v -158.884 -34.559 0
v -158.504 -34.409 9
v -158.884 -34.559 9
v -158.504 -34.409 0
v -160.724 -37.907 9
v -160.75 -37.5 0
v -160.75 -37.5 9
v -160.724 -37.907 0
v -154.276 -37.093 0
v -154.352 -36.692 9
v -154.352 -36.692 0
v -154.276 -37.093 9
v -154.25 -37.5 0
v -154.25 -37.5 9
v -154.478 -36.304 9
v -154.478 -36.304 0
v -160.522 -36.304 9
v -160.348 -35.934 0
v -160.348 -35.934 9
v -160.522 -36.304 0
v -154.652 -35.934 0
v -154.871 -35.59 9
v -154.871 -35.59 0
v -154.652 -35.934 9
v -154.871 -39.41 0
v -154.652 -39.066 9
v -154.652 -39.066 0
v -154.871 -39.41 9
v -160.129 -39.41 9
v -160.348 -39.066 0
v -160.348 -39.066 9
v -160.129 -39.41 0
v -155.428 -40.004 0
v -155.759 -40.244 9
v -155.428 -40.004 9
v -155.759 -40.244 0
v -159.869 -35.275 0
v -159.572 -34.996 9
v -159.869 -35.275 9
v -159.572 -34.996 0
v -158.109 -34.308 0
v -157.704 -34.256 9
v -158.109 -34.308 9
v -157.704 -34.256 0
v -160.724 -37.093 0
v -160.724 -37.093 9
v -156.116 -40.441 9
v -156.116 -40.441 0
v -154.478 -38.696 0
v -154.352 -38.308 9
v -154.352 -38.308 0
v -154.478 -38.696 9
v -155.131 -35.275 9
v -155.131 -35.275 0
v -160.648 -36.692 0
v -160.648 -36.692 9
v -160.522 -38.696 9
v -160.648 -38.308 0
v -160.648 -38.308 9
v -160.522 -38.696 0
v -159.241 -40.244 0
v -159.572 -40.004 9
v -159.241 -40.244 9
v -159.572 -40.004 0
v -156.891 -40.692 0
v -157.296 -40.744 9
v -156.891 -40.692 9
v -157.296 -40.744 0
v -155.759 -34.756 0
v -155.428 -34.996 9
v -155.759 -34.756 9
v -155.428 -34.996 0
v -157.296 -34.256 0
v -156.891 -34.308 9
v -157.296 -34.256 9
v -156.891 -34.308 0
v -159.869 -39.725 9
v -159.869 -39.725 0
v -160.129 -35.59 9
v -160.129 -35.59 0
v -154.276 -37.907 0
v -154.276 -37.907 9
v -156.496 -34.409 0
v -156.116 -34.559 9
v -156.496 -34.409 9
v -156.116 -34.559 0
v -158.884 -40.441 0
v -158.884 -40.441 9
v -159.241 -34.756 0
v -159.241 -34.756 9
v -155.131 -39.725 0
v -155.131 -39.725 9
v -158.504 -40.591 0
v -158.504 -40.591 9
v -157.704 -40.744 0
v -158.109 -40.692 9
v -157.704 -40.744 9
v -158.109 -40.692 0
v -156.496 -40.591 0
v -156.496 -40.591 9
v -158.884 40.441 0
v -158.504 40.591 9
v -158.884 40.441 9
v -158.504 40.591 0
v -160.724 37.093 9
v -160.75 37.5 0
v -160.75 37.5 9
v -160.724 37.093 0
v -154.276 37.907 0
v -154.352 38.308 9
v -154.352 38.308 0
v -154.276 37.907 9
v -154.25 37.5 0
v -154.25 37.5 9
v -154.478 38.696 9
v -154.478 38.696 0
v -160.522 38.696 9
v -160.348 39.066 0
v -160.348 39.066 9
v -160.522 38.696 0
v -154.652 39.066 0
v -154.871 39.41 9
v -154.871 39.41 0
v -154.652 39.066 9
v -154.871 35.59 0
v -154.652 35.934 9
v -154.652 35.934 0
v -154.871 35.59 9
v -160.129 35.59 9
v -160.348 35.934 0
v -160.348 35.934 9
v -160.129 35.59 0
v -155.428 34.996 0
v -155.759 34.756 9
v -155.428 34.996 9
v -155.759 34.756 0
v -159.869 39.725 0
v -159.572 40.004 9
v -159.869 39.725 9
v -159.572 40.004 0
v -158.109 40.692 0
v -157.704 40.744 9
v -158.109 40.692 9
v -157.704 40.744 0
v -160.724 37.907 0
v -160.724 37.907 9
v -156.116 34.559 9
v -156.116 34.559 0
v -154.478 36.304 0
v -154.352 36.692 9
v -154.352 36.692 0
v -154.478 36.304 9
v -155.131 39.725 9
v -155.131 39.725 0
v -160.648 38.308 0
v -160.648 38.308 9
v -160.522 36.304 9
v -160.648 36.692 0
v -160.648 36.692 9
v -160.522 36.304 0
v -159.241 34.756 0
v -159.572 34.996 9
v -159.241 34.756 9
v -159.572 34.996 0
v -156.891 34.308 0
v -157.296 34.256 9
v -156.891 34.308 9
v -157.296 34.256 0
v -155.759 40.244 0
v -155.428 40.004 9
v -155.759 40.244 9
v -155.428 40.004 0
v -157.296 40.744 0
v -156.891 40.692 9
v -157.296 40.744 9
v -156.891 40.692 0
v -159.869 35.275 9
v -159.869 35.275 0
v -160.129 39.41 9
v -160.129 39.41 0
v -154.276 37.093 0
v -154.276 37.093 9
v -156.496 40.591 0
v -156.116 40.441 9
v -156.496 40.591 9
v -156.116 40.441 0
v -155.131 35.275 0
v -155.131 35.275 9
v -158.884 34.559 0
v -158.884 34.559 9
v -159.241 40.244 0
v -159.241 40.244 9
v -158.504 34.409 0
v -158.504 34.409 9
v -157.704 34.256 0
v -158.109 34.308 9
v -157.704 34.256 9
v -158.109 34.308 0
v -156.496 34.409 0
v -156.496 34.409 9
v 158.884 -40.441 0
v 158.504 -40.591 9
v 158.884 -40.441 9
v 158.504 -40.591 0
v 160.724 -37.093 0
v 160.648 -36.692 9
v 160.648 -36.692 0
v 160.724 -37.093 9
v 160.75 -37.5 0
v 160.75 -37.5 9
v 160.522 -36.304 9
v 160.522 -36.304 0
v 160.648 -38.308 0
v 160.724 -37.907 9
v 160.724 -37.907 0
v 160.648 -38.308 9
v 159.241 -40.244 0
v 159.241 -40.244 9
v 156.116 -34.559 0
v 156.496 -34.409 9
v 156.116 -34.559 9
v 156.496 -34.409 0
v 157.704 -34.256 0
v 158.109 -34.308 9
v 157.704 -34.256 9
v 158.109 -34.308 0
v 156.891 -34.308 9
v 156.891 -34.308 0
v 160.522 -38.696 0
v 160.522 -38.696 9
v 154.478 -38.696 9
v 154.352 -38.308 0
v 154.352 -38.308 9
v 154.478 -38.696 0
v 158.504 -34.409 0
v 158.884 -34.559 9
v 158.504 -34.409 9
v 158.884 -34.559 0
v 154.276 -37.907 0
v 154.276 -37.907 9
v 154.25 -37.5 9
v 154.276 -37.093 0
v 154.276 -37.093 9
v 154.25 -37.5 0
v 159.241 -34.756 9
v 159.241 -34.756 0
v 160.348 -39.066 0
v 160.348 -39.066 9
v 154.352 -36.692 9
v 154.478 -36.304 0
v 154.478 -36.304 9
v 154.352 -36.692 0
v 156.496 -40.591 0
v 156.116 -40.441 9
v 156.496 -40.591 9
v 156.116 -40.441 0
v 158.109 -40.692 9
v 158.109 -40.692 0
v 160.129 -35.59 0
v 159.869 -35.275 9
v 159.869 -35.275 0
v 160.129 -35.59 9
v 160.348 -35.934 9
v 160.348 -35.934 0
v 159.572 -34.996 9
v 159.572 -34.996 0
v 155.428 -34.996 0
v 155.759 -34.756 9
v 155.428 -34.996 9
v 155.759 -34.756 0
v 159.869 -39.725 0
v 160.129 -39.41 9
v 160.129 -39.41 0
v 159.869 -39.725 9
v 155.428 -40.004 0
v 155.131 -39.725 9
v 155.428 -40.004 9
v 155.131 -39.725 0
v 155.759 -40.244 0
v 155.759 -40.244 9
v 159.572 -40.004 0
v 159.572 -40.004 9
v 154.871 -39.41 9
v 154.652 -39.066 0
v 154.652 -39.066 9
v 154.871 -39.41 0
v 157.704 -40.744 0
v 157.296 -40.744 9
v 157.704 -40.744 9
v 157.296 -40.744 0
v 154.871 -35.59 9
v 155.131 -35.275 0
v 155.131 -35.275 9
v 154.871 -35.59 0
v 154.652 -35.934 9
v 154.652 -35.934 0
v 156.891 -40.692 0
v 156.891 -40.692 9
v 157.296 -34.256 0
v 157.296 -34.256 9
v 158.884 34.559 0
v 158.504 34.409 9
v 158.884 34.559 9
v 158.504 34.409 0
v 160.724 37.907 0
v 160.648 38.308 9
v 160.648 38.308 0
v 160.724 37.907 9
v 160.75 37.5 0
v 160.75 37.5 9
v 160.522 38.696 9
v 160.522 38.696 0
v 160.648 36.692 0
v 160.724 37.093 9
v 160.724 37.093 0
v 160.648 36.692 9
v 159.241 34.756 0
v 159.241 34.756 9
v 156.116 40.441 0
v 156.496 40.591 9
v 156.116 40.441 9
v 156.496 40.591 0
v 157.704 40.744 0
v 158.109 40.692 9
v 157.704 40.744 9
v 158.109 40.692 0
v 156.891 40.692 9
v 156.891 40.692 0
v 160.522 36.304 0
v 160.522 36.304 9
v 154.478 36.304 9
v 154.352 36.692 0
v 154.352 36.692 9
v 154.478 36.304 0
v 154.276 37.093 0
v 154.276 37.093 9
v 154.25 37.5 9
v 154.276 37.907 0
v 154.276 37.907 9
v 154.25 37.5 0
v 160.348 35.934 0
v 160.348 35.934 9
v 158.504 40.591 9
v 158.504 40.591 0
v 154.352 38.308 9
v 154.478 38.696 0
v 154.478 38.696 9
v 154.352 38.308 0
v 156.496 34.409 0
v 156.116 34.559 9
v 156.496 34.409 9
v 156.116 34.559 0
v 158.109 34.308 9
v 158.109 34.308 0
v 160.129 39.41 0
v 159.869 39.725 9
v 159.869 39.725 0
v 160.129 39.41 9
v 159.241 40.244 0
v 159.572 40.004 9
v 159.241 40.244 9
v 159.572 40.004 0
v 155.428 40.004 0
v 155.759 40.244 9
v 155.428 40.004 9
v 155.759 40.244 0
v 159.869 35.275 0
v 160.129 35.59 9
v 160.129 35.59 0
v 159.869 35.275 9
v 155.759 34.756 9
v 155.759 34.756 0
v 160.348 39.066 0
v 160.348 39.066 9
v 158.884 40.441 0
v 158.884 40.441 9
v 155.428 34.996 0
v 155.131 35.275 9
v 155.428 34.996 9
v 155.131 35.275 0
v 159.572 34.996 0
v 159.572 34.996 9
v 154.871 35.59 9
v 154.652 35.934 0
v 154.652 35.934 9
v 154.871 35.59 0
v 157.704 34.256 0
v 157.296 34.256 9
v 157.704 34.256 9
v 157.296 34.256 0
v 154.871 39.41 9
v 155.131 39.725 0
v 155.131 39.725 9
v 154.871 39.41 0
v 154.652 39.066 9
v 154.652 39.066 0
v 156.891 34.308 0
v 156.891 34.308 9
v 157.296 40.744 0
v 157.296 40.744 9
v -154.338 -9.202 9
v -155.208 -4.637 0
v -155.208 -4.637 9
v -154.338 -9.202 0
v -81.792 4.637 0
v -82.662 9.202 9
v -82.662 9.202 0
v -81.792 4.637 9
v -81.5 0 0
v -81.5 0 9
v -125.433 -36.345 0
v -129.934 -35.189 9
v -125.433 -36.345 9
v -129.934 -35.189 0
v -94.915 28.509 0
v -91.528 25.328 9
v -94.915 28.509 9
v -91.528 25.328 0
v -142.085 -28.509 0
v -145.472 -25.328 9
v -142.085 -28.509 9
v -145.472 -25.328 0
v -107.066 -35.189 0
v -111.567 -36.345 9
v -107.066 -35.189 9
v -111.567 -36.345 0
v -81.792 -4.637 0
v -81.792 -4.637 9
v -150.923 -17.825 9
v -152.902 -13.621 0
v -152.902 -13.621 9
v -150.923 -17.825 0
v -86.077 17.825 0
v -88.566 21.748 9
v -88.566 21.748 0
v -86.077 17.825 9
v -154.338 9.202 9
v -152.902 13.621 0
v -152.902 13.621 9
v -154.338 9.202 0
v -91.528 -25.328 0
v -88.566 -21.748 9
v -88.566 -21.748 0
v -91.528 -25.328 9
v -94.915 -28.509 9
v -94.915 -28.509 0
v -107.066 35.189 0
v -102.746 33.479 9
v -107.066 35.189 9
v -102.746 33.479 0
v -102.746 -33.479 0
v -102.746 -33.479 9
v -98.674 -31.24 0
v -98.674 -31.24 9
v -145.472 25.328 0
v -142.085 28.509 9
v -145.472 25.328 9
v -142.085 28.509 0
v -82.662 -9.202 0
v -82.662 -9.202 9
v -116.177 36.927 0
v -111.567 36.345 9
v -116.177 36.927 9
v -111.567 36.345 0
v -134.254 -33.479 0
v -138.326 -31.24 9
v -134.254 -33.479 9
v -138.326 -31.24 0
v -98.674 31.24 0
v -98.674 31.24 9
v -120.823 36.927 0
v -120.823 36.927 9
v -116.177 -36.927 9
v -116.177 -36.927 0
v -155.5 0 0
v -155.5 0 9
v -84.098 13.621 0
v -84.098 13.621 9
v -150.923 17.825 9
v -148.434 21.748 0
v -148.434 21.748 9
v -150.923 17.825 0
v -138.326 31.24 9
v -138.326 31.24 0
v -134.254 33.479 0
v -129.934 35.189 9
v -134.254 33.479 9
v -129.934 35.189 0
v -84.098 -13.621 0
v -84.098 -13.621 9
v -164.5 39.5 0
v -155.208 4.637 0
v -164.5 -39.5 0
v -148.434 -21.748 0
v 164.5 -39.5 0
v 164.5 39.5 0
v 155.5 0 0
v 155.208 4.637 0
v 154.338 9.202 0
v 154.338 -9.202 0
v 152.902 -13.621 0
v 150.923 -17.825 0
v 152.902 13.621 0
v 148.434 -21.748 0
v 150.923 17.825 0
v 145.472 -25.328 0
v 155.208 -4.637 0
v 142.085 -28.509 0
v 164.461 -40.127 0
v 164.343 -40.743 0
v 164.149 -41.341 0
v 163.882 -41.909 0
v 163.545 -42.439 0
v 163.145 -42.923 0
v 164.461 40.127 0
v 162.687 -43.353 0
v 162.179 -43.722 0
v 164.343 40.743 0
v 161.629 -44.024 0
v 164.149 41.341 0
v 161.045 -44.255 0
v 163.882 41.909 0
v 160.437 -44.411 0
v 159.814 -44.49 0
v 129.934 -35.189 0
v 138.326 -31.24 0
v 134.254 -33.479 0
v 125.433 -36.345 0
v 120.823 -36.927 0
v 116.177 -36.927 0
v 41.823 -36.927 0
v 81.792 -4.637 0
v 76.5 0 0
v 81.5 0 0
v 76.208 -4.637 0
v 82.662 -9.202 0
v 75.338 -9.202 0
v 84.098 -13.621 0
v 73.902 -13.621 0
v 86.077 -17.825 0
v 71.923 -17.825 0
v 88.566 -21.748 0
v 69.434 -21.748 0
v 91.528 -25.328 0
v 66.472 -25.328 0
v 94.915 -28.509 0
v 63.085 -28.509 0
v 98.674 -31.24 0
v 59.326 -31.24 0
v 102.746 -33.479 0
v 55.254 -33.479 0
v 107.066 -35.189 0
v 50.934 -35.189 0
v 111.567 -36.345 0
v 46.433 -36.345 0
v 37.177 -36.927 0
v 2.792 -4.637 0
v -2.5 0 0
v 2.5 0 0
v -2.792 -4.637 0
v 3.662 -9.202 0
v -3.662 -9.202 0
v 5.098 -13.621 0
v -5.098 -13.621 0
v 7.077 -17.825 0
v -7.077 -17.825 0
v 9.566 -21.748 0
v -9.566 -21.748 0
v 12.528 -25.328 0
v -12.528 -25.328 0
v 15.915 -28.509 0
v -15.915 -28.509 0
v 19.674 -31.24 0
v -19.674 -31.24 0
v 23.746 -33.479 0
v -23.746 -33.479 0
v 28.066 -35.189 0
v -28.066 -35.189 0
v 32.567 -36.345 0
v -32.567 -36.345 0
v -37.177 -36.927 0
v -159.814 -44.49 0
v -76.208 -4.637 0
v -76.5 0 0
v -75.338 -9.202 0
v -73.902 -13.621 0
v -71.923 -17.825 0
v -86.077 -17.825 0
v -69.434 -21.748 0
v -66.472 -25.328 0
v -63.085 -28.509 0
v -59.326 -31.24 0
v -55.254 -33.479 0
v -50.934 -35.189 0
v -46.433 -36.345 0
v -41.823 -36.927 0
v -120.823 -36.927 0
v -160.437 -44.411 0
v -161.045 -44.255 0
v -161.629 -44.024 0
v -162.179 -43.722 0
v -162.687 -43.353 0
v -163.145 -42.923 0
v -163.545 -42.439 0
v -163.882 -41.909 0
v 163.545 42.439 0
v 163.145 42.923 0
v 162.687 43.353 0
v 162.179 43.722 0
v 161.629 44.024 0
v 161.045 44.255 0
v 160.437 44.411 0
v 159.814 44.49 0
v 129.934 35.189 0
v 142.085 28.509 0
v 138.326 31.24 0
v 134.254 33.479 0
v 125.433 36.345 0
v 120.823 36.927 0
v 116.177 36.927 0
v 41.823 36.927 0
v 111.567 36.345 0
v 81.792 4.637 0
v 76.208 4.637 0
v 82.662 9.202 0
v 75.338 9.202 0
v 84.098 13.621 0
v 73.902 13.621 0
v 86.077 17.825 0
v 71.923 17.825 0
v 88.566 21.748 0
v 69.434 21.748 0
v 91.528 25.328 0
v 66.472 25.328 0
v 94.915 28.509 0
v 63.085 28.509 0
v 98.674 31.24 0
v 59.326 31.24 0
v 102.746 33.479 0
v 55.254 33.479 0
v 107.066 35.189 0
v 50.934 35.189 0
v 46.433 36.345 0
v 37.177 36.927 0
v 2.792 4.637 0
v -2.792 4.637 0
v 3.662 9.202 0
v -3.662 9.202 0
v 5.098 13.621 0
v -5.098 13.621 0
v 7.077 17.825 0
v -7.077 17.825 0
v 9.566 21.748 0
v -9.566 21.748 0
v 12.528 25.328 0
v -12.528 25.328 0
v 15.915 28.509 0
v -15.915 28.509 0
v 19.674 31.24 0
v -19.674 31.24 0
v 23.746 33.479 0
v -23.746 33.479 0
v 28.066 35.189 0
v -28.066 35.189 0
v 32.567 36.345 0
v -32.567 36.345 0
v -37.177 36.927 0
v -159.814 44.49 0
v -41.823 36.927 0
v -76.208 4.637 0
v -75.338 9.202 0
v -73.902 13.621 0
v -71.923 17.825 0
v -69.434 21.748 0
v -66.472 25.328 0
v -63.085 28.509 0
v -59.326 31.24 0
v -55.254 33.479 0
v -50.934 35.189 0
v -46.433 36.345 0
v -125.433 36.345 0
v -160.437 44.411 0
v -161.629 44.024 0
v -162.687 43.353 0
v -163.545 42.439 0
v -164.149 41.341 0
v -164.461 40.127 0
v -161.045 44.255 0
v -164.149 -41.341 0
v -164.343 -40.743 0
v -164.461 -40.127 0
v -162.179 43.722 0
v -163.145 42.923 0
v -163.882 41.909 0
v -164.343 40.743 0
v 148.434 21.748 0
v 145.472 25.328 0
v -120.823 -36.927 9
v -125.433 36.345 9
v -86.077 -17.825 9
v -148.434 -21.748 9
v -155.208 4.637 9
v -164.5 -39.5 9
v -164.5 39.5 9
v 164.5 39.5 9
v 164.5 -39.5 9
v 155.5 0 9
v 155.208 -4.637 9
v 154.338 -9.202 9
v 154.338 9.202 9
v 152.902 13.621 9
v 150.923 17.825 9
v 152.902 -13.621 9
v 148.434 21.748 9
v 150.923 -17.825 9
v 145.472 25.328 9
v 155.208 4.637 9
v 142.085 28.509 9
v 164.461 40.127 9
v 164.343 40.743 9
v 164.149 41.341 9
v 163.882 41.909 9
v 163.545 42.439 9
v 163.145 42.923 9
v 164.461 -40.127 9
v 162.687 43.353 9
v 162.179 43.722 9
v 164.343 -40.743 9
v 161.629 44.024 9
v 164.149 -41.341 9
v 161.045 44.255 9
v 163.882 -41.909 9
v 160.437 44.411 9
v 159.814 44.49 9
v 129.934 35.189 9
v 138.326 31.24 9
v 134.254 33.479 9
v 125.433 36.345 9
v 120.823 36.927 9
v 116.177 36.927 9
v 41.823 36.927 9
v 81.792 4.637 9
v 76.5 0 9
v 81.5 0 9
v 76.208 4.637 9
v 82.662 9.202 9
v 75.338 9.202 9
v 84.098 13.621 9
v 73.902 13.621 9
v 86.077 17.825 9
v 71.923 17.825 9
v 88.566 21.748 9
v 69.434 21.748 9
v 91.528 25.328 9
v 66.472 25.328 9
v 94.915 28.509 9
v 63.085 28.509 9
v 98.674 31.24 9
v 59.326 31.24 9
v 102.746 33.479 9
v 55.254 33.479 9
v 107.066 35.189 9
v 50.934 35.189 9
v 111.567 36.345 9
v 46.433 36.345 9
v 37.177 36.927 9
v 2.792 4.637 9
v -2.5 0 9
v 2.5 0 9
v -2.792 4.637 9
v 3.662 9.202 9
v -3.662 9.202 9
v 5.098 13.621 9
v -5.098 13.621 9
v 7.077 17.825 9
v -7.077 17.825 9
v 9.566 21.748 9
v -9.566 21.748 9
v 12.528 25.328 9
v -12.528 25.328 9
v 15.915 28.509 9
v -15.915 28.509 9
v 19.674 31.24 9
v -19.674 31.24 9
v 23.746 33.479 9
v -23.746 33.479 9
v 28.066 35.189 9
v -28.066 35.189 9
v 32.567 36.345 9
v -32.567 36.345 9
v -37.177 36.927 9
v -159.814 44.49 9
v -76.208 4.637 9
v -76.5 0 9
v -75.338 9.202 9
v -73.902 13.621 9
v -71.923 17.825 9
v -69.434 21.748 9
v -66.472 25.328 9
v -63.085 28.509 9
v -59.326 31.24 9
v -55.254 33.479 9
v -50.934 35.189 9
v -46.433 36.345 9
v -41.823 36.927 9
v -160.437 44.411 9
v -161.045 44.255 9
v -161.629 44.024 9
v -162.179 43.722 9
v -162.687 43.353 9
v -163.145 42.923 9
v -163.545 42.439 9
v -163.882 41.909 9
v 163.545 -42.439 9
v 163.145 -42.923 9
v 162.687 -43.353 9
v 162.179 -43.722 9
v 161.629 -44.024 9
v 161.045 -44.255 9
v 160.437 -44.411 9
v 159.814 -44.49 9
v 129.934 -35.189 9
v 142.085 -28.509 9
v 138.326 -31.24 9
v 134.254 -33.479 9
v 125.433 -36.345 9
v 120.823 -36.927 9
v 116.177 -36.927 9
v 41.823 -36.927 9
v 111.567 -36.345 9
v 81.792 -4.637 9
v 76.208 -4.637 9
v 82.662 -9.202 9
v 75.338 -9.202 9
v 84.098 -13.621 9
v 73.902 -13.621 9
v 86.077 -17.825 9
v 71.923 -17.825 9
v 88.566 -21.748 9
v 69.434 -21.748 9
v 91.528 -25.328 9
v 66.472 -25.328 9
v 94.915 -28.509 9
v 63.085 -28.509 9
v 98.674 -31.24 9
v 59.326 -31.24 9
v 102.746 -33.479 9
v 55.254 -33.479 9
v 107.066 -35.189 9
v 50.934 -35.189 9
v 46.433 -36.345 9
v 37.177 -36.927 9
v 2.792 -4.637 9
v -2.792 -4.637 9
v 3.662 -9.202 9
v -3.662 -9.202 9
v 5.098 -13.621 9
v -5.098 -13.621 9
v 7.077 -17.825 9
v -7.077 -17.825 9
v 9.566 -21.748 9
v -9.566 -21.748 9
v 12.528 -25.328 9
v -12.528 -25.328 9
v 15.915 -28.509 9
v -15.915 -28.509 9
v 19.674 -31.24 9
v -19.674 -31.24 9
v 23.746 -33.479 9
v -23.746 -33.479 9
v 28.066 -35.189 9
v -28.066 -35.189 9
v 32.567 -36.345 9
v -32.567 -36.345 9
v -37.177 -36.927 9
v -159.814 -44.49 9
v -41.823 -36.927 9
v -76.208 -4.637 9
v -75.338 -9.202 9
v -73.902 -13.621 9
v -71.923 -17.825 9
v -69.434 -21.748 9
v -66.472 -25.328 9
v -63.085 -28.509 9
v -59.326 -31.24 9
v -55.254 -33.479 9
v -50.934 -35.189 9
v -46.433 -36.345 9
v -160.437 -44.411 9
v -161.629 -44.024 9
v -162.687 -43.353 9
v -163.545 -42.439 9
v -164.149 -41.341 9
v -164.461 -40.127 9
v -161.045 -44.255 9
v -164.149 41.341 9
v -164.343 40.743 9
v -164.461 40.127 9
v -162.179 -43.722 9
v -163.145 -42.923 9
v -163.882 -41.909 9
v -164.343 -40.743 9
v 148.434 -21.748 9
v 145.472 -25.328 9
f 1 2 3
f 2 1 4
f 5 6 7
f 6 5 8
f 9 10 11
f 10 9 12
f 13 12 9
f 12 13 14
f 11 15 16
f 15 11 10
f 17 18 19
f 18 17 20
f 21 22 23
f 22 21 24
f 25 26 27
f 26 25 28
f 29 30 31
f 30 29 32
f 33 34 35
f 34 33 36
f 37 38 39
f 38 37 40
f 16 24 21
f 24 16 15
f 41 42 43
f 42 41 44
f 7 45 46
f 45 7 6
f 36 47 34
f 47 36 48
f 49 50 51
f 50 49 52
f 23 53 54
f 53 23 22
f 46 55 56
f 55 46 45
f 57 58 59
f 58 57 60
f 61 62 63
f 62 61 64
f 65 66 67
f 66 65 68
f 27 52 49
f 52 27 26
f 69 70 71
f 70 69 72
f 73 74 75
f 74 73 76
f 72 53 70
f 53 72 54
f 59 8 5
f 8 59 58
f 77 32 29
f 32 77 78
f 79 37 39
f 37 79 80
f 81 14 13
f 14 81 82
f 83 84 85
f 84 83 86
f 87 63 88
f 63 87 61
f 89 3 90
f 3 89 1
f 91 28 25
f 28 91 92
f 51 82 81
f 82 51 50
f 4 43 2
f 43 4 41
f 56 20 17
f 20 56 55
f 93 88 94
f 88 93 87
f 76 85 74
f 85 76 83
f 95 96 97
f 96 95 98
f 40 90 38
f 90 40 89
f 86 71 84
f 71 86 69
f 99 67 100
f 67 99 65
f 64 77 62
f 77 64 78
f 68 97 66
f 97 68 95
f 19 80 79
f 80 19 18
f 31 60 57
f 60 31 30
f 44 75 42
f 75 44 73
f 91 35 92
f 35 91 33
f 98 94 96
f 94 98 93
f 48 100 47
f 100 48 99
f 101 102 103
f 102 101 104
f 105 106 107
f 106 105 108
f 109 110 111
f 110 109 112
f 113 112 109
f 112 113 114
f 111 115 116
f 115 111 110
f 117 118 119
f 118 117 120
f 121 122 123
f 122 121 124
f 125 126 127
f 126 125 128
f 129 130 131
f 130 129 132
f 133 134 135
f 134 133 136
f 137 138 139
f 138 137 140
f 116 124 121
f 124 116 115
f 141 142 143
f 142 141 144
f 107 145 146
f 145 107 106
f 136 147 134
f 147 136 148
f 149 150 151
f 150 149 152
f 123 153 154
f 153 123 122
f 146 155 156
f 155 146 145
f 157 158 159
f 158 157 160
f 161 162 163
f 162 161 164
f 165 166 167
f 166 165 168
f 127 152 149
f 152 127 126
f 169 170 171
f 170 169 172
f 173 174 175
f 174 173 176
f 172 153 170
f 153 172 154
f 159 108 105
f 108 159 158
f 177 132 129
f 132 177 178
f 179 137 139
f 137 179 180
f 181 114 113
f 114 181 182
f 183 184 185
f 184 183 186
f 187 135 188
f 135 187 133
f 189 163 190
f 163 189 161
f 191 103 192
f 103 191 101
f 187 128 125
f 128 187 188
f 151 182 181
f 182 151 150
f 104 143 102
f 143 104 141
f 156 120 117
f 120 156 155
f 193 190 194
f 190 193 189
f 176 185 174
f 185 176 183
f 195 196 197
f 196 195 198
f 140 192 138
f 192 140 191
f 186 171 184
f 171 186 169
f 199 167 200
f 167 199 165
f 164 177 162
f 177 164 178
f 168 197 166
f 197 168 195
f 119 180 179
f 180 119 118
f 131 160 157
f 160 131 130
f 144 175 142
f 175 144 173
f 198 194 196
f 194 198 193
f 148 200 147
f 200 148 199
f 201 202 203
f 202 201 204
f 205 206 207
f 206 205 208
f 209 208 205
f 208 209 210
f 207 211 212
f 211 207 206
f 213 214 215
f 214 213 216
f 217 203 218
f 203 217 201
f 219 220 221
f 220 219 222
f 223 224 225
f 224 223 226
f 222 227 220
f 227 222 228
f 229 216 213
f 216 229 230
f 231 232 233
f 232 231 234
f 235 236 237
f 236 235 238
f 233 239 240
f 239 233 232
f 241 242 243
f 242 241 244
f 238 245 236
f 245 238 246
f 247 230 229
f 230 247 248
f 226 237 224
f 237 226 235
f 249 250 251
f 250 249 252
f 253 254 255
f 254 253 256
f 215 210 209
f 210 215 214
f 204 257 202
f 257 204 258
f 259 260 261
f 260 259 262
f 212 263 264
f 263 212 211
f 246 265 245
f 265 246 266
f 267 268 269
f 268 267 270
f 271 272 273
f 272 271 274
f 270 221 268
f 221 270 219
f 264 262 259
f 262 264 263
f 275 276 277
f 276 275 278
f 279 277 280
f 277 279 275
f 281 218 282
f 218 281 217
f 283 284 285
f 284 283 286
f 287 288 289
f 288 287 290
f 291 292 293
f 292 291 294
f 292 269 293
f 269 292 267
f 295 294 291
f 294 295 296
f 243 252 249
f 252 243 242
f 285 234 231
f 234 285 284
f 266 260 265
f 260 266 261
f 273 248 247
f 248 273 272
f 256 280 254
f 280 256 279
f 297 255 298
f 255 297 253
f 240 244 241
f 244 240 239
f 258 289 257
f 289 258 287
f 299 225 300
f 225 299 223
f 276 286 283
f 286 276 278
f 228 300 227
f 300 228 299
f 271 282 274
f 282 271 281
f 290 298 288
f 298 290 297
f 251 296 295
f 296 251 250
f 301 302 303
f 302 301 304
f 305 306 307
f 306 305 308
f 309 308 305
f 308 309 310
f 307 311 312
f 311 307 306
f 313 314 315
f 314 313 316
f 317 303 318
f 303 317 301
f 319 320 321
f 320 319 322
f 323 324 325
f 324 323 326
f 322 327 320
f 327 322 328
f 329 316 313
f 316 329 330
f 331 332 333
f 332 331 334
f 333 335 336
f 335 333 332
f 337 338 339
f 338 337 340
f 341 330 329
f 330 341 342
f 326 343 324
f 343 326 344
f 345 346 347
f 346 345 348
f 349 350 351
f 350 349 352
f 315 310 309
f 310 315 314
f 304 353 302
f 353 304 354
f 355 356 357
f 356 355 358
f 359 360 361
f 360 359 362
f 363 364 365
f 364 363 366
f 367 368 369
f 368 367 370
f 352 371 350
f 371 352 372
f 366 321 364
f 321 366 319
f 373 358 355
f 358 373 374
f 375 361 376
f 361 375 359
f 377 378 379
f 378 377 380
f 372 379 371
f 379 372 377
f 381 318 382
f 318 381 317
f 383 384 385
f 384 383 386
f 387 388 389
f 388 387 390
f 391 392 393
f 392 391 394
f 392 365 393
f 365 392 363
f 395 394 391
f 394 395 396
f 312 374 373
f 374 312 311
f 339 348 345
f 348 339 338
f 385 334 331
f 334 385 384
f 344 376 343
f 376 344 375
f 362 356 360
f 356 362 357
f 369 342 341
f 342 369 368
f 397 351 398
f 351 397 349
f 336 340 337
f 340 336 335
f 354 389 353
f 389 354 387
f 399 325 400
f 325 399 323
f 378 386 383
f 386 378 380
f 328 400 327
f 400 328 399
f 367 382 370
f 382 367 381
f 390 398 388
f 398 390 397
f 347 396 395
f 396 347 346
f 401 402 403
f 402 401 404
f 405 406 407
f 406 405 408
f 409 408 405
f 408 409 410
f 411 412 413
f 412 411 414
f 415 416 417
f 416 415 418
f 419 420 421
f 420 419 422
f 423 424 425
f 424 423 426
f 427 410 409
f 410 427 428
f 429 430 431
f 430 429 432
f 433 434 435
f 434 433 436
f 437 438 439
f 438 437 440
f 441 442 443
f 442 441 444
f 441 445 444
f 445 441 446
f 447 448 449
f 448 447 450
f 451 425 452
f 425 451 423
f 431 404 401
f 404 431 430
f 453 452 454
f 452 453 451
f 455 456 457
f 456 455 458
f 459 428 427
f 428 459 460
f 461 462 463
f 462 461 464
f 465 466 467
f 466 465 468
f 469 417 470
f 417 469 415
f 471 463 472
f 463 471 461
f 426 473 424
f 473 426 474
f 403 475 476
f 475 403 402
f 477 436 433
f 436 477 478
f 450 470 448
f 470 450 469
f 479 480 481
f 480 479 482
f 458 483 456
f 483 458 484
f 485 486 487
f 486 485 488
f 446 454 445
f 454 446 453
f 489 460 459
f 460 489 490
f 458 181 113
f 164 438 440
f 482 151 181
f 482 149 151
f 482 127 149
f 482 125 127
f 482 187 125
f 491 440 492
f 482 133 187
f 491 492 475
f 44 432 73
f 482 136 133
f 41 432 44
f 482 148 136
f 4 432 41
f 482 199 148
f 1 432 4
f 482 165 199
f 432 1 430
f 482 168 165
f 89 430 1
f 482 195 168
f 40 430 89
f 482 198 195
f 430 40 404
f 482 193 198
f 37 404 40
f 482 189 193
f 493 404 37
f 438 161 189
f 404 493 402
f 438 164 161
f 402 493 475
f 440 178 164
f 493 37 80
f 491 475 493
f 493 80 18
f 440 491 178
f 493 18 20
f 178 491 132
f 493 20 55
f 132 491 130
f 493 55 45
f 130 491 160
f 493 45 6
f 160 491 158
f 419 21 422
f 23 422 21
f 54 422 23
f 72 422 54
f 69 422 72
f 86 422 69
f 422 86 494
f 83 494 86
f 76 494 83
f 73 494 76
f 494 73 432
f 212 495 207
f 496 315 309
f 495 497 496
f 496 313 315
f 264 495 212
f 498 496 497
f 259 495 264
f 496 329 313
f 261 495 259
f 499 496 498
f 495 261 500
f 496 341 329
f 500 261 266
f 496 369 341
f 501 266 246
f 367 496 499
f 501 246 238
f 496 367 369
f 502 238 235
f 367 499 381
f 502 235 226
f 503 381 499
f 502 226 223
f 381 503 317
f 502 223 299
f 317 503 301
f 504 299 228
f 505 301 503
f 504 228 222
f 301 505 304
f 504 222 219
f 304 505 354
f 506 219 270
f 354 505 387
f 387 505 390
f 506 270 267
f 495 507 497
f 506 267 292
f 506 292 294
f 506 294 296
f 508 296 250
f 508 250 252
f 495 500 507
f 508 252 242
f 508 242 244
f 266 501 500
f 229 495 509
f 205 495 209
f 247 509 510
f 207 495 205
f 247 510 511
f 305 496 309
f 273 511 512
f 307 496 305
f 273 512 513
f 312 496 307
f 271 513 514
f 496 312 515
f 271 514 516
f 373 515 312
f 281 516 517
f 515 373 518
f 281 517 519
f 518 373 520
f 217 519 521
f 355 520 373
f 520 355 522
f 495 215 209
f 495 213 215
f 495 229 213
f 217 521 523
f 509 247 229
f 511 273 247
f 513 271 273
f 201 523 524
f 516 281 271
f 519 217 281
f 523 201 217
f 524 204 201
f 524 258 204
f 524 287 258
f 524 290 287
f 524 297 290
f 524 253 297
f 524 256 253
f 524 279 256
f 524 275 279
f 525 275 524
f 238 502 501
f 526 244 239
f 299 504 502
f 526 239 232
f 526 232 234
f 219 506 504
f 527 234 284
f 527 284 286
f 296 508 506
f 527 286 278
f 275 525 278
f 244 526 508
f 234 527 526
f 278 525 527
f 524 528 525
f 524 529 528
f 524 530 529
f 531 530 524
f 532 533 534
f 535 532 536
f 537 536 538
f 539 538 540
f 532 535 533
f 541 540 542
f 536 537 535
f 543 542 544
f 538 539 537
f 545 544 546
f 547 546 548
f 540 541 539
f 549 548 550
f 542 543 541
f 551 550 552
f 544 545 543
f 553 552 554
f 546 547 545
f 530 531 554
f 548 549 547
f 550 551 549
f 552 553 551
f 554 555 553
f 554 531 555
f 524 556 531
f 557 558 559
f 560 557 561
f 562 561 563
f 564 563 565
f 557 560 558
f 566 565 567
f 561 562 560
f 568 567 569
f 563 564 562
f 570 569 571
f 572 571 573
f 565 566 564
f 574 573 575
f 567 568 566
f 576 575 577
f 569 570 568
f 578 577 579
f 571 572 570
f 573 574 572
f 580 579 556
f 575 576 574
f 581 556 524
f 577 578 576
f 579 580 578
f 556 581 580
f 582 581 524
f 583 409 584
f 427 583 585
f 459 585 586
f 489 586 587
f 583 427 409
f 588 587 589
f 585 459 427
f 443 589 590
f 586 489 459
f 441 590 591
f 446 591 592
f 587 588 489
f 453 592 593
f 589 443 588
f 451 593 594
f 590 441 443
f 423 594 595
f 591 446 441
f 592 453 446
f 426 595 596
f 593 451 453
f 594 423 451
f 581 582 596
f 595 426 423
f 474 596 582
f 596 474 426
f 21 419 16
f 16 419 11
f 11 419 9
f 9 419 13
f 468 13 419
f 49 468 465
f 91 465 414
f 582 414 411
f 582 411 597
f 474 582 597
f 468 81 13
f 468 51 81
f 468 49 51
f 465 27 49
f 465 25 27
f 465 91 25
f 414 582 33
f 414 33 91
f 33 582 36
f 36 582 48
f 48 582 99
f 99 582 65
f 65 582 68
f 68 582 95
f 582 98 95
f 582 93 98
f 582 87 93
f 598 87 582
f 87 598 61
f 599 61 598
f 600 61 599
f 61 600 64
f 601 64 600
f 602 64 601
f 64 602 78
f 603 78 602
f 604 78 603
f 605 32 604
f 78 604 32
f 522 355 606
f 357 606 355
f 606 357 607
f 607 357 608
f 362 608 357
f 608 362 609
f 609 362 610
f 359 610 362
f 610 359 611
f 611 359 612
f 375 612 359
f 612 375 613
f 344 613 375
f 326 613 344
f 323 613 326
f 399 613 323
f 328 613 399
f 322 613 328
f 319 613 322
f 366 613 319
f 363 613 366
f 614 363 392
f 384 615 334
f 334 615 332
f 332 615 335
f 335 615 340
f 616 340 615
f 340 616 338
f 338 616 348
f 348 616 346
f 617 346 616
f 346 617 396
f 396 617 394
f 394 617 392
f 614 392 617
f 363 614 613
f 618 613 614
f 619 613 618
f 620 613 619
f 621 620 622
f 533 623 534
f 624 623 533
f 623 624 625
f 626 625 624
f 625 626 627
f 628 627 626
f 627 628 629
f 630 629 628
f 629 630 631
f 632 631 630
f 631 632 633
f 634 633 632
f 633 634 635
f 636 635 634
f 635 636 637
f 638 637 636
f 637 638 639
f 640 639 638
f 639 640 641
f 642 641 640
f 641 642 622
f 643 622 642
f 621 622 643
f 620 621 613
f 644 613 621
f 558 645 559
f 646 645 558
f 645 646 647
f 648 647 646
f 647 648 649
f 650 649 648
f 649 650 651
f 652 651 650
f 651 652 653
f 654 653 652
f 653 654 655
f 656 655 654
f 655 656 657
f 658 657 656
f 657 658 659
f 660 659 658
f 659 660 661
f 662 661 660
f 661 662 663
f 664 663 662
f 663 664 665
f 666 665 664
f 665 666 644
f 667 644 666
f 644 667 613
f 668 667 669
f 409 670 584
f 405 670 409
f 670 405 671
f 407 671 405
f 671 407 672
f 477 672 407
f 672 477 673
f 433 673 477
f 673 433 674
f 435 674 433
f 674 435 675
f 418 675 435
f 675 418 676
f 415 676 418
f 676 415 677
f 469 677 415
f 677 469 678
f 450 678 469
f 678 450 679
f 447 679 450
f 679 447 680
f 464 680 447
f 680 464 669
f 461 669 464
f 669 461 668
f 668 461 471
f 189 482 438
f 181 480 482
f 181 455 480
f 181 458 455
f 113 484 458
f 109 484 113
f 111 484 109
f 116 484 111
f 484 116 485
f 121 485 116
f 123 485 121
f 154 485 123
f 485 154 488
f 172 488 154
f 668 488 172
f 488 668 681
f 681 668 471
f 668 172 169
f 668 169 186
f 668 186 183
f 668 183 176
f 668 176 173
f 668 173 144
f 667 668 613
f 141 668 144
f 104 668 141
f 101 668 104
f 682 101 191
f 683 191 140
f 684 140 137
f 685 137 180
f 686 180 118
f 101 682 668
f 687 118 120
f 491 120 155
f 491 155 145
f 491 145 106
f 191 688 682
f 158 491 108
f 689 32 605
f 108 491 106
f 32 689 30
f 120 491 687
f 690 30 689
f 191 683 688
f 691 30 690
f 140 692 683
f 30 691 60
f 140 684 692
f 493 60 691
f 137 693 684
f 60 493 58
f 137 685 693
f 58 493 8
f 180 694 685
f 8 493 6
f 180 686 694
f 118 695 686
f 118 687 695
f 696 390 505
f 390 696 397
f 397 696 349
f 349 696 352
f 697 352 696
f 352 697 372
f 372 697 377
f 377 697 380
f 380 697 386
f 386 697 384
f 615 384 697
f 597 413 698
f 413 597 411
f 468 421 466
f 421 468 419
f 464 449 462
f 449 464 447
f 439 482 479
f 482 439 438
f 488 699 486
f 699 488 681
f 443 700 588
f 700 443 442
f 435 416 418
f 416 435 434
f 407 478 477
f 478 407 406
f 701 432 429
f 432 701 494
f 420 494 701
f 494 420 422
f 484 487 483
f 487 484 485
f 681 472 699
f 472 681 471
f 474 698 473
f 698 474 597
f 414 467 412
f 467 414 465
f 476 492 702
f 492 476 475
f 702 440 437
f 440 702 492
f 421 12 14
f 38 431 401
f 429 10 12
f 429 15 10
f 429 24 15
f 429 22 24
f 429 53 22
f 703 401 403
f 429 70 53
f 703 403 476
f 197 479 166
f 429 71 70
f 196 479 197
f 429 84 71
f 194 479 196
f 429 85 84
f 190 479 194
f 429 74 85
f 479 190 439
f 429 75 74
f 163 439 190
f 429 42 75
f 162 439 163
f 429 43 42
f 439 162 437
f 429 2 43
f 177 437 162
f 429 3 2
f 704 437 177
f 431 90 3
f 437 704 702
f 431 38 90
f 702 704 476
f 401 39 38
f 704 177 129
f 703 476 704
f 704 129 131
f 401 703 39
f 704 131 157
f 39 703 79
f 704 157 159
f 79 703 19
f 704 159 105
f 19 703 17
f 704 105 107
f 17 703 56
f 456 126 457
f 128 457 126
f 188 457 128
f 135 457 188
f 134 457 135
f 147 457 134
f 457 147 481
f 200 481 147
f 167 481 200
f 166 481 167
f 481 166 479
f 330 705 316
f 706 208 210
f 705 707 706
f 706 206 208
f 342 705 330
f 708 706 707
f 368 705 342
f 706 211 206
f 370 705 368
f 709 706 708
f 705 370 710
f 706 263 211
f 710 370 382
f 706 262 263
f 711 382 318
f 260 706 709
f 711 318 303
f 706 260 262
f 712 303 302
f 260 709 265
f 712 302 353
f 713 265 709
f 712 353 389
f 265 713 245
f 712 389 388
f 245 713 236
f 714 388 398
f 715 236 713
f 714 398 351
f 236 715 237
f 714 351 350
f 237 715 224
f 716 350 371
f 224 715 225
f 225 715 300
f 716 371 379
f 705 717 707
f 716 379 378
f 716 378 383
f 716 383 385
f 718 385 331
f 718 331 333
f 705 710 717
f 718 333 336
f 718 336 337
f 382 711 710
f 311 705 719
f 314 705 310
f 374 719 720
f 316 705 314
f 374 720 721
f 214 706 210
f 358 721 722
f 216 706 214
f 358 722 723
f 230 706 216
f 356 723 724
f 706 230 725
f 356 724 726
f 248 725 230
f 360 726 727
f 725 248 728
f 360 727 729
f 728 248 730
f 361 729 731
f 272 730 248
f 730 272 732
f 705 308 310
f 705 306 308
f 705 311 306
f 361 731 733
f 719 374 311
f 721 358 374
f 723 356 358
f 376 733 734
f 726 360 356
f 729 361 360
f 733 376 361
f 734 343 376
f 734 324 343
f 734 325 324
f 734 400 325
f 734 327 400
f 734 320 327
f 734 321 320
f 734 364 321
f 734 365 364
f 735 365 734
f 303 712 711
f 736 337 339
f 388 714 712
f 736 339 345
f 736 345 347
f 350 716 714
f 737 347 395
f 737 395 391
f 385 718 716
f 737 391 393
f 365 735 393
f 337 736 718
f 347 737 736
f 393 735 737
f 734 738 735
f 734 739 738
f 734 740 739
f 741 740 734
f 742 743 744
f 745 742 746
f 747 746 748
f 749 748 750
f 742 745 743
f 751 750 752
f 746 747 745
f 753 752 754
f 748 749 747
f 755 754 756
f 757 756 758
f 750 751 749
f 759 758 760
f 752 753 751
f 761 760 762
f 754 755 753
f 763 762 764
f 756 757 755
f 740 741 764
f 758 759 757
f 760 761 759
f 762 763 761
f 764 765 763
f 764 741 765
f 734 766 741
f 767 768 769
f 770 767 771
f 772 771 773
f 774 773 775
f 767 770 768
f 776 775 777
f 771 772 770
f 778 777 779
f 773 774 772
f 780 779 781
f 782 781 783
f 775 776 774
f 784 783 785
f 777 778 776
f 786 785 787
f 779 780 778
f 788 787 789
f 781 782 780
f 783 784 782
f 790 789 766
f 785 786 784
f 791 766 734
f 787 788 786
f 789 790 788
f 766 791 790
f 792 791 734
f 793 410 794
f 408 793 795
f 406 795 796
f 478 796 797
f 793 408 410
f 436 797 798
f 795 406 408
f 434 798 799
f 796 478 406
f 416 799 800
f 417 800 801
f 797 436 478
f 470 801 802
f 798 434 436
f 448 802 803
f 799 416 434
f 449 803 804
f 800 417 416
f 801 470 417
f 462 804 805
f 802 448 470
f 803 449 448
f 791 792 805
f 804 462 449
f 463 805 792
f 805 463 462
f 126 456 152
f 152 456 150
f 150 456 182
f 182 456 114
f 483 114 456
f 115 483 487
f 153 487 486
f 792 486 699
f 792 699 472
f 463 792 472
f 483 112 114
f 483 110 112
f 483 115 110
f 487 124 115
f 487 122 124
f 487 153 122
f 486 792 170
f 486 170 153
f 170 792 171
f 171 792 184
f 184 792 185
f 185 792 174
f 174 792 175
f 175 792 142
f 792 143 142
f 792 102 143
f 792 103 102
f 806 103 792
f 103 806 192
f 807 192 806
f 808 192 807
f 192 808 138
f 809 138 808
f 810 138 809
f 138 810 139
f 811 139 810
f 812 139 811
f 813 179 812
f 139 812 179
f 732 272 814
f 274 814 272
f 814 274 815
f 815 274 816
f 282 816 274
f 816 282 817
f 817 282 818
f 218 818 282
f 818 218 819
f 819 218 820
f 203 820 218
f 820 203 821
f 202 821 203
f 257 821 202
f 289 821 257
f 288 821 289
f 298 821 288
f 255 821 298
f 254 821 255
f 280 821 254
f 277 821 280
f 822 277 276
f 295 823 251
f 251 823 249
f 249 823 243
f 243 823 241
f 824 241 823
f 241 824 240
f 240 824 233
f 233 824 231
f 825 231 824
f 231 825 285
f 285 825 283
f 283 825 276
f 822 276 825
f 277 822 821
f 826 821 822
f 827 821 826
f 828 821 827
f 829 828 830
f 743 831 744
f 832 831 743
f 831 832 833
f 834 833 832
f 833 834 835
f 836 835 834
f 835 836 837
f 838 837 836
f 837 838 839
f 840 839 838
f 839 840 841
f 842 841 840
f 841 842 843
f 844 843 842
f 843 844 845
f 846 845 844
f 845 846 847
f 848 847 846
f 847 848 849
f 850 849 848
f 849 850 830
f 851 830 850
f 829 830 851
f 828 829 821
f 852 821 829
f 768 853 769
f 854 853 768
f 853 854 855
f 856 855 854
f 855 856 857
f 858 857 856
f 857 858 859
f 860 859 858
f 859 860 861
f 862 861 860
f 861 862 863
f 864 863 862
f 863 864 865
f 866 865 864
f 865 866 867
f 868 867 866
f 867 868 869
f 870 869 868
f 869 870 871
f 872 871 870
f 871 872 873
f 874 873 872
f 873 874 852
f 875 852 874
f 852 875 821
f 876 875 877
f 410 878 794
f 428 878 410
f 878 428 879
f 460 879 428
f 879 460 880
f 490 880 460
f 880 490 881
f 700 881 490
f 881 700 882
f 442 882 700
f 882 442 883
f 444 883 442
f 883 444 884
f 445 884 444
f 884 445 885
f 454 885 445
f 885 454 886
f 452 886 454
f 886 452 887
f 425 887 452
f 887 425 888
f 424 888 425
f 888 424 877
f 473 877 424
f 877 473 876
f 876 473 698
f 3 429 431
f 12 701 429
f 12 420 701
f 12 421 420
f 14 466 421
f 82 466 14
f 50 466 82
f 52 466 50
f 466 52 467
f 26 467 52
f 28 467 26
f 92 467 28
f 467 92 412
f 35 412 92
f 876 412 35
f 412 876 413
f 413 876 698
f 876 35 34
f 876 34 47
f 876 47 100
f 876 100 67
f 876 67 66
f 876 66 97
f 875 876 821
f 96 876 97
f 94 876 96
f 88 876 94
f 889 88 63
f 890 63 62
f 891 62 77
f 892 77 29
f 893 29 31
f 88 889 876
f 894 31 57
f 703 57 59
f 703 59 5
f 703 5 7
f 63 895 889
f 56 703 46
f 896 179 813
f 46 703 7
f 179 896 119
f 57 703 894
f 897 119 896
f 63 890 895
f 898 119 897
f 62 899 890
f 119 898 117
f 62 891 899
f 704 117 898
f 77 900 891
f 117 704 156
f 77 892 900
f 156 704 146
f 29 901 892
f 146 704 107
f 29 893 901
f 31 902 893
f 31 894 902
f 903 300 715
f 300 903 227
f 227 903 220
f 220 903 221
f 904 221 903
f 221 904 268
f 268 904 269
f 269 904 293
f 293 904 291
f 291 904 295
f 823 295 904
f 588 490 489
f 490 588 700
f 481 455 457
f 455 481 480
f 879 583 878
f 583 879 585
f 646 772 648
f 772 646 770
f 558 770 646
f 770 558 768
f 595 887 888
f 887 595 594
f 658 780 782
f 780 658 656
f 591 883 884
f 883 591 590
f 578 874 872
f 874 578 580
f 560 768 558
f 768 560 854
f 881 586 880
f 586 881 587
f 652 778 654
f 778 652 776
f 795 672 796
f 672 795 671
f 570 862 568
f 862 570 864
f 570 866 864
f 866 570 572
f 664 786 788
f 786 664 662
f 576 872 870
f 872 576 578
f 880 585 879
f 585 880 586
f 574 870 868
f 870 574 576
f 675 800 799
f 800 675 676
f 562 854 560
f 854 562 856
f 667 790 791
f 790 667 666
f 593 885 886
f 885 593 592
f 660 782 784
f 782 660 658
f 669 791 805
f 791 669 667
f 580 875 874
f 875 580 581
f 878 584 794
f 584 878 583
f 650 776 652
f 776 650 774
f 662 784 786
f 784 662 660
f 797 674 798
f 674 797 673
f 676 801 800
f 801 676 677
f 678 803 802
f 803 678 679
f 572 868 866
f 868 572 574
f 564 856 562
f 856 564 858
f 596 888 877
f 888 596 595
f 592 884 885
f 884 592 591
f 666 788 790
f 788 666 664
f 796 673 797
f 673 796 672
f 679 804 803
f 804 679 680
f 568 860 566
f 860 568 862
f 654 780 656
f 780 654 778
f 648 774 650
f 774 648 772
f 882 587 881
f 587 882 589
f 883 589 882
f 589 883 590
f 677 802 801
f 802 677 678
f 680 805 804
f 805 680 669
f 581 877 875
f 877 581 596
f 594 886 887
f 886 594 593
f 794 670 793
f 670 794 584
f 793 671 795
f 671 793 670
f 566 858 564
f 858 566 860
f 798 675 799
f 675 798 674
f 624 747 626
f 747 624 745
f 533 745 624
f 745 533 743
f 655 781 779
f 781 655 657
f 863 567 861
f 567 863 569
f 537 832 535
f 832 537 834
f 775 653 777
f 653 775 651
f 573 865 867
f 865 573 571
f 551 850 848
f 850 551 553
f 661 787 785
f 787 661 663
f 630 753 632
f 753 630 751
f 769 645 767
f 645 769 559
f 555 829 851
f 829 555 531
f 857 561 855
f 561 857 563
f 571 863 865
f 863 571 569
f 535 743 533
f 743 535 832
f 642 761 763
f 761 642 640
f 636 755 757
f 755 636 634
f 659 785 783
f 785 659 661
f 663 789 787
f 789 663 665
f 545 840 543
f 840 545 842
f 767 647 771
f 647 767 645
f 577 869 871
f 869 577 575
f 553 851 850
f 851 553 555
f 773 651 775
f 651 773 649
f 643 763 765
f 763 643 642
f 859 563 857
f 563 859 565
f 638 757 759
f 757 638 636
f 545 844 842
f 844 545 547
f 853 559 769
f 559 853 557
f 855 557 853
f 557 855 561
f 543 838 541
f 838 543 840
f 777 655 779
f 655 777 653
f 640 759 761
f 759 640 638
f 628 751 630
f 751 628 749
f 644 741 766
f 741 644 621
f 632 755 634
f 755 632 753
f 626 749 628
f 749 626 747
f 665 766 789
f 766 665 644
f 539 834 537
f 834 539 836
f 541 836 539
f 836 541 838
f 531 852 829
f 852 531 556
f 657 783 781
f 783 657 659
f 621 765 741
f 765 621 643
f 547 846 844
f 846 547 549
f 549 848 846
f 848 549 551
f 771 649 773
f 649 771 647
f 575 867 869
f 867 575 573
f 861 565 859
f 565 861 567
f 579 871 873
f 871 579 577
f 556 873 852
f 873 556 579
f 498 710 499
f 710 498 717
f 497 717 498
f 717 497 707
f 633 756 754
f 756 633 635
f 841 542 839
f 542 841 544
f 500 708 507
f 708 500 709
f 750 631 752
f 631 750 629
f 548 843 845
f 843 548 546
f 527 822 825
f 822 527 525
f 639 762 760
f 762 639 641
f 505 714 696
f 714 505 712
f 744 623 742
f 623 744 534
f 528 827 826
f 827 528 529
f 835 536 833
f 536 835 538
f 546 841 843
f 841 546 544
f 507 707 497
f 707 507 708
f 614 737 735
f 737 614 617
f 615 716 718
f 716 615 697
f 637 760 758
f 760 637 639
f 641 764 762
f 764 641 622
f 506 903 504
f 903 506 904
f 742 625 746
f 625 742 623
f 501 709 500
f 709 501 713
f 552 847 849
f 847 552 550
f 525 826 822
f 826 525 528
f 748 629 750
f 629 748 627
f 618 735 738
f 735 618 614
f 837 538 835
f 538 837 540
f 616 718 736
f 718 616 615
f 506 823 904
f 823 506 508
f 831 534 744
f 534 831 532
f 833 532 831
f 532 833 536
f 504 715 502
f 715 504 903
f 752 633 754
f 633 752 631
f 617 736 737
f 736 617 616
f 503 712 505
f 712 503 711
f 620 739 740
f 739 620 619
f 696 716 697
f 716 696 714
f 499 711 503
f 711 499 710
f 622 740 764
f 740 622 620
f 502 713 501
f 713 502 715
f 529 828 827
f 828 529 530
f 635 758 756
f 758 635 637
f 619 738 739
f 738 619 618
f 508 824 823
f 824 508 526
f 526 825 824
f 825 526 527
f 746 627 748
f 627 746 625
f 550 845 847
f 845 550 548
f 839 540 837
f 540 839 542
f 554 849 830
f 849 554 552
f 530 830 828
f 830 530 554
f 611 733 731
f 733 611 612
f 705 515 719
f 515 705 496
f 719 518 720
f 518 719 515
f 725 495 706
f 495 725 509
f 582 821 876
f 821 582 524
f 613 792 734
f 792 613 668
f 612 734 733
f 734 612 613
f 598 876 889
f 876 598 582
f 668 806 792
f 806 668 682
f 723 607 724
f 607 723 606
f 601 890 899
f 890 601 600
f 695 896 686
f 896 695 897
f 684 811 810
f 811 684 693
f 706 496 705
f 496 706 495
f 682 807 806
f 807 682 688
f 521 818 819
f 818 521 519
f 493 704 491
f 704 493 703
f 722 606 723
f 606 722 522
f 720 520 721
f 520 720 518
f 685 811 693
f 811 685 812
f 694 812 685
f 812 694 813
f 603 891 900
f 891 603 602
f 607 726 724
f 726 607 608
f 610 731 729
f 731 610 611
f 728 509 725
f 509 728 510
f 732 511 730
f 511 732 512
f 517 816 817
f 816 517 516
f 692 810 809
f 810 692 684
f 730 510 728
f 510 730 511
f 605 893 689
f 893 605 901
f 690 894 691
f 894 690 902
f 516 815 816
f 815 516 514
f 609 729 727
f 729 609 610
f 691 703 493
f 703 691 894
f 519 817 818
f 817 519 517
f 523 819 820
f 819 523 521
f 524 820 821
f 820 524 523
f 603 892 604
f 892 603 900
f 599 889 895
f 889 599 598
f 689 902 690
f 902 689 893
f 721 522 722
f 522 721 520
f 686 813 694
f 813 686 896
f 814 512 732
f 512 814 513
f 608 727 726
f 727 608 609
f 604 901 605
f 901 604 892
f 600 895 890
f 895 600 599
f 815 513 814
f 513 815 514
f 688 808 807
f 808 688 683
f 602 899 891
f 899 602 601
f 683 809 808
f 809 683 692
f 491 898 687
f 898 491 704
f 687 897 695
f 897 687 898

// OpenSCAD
$fn = 50;


difference() {
	union() {
		hull() {
			translate(v = [-159.5000000000, 39.5000000000, 0]) {
				cylinder(h = 9, r = 5);
			}
			translate(v = [159.5000000000, 39.5000000000, 0]) {
				cylinder(h = 9, r = 5);
			}
			translate(v = [-159.5000000000, -39.5000000000, 0]) {
				cylinder(h = 9, r = 5);
			}
			translate(v = [159.5000000000, -39.5000000000, 0]) {
				cylinder(h = 9, r = 5);
			}
		}
	}
	union() {
		#translate(v = [-157.5000000000, -37.5000000000, -100.0000000000]) {
			cylinder(h = 200, r = 3.2500000000);
		}
		#translate(v = [-157.5000000000, 37.5000000000, -100.0000000000]) {
			cylinder(h = 200, r = 3.2500000000);
		}
		#translate(v = [157.5000000000, -37.5000000000, -100.0000000000]) {
			cylinder(h = 200, r = 3.2500000000);
		}
		#translate(v = [157.5000000000, 37.5000000000, -100.0000000000]) {
			cylinder(h = 200, r = 3.2500000000);
		}
		#translate(v = [-118.5000000000, 0, 0]) {
			cylinder(h = 9, r = 37.0000000000);
		}
		#translate(v = [-39.5000000000, 0, 0]) {
			cylinder(h = 9, r = 37.0000000000);
		}
		#translate(v = [39.5000000000, 0, 0]) {
			cylinder(h = 9, r = 37.0000000000);
		}
		#translate(v = [118.5000000000, 0, 0]) {
			cylinder(h = 9, r = 37.0000000000);
		}
	}
}
